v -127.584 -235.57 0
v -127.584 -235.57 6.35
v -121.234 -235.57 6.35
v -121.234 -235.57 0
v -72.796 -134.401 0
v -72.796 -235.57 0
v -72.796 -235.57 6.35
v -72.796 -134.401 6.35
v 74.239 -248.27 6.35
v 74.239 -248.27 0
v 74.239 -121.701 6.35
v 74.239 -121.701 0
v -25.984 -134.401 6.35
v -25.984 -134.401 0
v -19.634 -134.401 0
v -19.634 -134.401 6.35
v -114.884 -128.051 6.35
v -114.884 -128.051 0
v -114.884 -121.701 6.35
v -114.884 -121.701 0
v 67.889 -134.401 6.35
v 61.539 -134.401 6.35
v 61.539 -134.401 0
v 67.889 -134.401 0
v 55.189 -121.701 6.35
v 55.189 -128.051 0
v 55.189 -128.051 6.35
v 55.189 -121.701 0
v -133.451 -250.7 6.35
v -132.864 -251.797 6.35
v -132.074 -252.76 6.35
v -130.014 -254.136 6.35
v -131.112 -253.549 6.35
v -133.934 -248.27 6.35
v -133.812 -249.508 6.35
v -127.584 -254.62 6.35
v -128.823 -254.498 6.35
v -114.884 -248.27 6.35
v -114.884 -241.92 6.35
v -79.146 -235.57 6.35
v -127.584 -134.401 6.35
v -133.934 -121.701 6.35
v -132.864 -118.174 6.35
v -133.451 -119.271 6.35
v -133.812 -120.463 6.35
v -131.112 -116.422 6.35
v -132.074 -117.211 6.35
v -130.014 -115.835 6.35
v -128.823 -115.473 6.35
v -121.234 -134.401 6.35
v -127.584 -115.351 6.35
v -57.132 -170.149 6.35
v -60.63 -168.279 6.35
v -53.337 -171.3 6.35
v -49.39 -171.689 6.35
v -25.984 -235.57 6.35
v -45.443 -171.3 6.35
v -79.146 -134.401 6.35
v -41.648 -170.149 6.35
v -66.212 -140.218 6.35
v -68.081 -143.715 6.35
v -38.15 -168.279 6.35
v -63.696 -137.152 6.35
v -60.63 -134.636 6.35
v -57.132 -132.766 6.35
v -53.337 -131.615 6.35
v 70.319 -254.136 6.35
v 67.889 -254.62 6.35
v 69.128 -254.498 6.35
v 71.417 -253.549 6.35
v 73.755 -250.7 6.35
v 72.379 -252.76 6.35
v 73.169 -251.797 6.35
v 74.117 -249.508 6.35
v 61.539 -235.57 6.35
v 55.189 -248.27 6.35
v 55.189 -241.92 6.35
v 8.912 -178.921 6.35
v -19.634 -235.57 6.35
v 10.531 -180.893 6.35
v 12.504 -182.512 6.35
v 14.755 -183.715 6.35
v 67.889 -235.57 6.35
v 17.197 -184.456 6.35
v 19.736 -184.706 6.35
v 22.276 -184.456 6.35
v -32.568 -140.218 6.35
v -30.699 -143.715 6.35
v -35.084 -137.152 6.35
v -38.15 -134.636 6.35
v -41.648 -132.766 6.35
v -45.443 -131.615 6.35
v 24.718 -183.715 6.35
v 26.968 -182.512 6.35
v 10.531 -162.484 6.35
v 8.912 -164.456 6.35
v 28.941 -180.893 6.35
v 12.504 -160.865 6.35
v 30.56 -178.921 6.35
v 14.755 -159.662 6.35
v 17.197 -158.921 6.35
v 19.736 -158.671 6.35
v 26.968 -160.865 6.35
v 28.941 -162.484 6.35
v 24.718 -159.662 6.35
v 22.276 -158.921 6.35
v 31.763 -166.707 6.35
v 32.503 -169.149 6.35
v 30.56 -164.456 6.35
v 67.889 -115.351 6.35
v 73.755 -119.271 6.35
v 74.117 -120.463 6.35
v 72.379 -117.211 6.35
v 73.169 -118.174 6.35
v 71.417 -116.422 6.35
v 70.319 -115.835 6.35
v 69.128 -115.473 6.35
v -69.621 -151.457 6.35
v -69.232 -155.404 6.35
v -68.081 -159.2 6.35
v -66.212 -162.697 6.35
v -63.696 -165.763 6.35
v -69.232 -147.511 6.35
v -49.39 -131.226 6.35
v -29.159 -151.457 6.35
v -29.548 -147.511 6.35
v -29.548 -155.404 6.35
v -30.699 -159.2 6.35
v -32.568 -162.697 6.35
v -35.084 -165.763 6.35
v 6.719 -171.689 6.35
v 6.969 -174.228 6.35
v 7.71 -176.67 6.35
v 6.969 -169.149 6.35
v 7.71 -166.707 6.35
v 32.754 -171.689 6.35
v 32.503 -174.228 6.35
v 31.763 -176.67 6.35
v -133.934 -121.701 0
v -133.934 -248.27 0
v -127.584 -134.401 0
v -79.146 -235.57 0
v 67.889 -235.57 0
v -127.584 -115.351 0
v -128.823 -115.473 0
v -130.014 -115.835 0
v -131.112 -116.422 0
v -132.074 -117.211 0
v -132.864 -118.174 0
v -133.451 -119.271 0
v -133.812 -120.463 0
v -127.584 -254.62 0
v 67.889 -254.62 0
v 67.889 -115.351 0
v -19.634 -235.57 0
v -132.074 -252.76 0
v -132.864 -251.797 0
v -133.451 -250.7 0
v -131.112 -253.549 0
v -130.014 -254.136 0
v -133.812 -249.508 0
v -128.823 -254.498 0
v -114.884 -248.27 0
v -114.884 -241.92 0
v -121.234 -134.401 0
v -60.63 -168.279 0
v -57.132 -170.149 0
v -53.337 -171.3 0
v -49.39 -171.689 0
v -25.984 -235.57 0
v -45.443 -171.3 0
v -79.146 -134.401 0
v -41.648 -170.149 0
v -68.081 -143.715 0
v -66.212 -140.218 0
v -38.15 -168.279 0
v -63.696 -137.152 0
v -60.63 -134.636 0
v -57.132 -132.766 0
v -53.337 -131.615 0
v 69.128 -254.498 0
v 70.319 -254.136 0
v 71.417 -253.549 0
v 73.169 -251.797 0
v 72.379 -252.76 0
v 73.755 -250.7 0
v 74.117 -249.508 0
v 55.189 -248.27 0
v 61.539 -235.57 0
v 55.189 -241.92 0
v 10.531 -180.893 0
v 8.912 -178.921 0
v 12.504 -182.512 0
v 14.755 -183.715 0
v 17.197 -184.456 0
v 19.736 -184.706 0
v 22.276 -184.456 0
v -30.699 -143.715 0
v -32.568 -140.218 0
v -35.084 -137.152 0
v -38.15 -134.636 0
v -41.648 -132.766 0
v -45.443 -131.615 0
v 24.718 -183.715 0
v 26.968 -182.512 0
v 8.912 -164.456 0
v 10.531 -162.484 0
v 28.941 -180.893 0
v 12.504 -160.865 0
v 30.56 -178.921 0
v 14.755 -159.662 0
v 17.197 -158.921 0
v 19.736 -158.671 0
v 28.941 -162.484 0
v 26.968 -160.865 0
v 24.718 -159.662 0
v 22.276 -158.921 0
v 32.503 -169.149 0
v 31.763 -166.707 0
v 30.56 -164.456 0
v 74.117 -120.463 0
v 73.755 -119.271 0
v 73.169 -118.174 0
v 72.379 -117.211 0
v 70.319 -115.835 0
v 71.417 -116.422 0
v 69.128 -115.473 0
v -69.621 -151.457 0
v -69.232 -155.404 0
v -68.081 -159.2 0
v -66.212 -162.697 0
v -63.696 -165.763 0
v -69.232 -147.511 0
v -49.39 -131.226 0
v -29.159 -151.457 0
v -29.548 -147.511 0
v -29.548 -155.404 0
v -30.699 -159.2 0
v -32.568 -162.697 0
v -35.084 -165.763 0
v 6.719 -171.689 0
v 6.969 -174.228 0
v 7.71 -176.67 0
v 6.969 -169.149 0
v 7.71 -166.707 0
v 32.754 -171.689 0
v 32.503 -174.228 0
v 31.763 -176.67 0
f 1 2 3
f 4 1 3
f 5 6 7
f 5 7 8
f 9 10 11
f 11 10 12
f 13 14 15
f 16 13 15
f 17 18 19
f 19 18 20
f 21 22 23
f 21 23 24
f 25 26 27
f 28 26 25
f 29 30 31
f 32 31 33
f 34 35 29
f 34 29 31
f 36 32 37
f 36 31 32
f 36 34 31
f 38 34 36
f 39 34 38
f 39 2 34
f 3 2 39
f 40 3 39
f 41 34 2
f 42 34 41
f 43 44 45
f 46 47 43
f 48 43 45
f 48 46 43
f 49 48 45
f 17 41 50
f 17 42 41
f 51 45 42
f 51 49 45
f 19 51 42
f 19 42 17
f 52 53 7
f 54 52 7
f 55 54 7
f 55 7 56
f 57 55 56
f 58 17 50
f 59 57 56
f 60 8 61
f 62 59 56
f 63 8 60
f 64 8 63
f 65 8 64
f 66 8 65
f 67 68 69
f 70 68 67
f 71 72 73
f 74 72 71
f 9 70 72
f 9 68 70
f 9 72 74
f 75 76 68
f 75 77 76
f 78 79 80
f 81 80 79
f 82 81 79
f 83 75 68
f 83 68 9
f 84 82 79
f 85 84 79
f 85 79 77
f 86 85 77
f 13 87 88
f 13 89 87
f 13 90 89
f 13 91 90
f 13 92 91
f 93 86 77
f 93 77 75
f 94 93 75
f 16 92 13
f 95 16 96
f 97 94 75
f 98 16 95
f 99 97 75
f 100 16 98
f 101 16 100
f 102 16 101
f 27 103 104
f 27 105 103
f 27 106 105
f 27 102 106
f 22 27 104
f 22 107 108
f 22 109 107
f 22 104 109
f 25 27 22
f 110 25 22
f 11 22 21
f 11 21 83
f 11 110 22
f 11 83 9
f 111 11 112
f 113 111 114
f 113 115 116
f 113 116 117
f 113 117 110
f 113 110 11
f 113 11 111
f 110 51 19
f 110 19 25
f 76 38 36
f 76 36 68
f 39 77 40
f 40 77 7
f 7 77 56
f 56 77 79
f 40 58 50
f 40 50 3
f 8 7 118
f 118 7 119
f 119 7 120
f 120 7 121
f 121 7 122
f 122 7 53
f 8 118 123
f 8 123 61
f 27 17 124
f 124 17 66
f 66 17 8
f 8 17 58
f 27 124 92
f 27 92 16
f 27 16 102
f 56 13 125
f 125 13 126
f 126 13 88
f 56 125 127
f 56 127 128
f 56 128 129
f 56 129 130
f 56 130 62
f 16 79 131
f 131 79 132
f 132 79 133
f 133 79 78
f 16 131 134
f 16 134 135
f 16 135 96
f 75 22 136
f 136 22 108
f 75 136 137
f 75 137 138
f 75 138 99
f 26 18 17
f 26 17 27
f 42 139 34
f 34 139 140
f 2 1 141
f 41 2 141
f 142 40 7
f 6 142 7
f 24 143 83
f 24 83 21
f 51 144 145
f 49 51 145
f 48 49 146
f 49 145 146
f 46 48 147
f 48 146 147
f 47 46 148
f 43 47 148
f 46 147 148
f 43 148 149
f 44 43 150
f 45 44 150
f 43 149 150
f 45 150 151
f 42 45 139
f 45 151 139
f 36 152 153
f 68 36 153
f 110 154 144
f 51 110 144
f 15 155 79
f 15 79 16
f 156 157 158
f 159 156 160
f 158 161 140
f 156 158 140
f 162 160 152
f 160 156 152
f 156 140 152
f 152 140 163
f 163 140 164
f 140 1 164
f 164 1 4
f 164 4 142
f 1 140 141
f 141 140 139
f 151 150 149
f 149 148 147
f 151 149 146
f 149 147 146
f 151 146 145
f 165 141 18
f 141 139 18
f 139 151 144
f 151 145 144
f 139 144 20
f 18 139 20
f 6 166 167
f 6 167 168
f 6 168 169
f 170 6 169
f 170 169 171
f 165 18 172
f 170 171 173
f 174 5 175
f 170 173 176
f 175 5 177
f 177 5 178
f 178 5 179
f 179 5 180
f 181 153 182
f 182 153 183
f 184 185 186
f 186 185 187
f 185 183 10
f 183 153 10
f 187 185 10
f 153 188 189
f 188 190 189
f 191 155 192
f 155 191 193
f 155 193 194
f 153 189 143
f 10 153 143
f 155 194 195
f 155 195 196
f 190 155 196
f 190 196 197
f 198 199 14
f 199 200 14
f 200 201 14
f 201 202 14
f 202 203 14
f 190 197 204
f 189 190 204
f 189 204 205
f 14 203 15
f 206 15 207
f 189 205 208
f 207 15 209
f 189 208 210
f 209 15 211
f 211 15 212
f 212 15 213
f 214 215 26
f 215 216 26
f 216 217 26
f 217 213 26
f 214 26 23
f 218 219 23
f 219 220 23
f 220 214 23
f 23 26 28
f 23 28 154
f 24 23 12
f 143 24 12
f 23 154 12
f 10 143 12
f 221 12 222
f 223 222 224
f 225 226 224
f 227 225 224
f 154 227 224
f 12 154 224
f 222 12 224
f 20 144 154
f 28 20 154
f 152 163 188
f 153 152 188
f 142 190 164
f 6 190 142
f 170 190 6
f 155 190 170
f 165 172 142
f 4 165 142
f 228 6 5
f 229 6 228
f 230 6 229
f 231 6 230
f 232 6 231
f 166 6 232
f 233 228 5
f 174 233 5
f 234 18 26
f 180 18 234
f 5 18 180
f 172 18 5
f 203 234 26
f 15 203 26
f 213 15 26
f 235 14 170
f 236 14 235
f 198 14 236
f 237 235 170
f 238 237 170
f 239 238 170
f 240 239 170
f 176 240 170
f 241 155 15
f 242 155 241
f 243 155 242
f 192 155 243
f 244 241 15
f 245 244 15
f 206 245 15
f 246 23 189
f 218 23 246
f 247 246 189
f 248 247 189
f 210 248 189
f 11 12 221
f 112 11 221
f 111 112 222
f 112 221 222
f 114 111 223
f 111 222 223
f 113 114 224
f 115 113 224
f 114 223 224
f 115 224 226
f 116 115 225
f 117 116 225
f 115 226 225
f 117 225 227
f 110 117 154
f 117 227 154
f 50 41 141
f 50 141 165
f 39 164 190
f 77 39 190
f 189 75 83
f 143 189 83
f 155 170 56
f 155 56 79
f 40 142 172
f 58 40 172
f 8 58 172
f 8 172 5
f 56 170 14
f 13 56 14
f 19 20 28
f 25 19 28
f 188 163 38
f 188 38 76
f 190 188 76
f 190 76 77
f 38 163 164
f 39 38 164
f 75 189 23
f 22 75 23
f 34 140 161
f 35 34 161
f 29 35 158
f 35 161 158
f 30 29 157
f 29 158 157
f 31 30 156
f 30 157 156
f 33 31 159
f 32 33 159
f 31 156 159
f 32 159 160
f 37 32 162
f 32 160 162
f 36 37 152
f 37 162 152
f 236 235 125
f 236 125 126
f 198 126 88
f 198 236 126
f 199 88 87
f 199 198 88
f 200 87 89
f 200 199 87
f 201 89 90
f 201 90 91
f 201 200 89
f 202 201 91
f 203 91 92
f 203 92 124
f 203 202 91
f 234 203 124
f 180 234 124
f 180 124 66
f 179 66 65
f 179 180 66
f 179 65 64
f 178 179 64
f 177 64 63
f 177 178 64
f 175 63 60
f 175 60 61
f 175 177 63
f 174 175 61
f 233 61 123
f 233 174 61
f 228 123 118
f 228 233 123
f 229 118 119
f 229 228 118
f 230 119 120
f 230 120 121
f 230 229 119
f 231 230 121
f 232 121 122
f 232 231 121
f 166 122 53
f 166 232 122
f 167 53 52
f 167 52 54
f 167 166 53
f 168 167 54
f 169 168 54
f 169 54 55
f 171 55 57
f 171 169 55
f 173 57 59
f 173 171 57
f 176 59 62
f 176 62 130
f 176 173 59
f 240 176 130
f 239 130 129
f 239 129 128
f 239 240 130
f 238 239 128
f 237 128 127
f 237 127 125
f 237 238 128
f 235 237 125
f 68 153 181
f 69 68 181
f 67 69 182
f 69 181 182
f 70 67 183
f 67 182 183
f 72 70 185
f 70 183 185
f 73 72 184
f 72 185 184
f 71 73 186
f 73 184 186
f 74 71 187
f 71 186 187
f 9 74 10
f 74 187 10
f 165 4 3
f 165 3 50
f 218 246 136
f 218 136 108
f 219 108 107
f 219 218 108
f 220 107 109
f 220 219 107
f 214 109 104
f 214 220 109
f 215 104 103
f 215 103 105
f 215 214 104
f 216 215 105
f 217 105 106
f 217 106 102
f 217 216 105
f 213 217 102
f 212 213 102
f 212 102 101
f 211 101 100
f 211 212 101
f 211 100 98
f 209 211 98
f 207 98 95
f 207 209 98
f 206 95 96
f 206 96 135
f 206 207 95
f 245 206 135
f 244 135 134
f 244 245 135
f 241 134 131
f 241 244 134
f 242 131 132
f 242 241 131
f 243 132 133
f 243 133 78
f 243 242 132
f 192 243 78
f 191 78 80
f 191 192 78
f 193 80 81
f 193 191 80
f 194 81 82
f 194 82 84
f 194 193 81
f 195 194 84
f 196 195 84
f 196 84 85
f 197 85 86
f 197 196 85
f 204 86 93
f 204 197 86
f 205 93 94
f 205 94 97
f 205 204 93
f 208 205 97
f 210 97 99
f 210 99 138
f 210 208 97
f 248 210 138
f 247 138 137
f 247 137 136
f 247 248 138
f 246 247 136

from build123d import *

# Parameters (mm, degrees)
SKETCH1_R           = 20.2311
SKETCH1_R_2         = 13.0175
SKETCH1_W           = 6.35
SKETCH1_H           = 101.1682
SKETCH1_W_2         = 170.072742275
SKETCH1_H_2         = 6.35
BOSS_EXTRUDE1_DEPTH = 6.35


with BuildPart() as part:
    # Sketch1 → Boss-Extrude1 (new body)
    with BuildSketch(Plane.XY):
        with BuildLine():
            Line((-127.583895856, -254.619594065), (67.888846419, -254.619594065))
            ThreePointArc((67.888846419, -254.619594065), (72.378974479, -252.759722126), (74.238846419, -248.269594065))
            Line((74.238846419, -248.269594065), (74.238846419, -121.701394065))
            ThreePointArc((74.238846419, -121.701394065), (72.378974479, -117.211266005), (67.888846419, -115.351394065))
            Line((67.888846419, -115.351394065), (-127.583895856, -115.351394065))
            ThreePointArc((-127.583895856, -115.351394065), (-132.074023916, -117.211266005), (-133.933895856, -121.701394065))
            Line((-133.933895856, -121.701394065), (-133.933895856, -248.269594065))
            ThreePointArc((-133.933895856, -248.269594065), (-132.074023916, -252.759722126), (-127.583895856, -254.619594065))
        make_face()
        with Locations((-49.389995856, -151.457494065)):
            Circle(SKETCH1_R, mode=Mode.SUBTRACT)
        with Locations((19.736104144, -171.688594065)):
            Circle(SKETCH1_R_2, mode=Mode.SUBTRACT)
        with Locations((-75.971095856, -184.985494065)):
            Rectangle(SKETCH1_W, SKETCH1_H, mode=Mode.SUBTRACT)
        with Locations((-124.408895856, -184.985494065)):
            Rectangle(SKETCH1_W, SKETCH1_H, mode=Mode.SUBTRACT)
        with Locations((64.713846419, -184.985494065)):
            Rectangle(SKETCH1_W, SKETCH1_H, mode=Mode.SUBTRACT)
        with Locations((-22.808895856, -184.985494065)):
            Rectangle(SKETCH1_W, SKETCH1_H, mode=Mode.SUBTRACT)
        with Locations((-29.847524719, -124.876394065)):
            Rectangle(SKETCH1_W_2, SKETCH1_H_2, mode=Mode.SUBTRACT)
        with Locations((-29.847524719, -245.094594065)):
            Rectangle(SKETCH1_W_2, SKETCH1_H_2, mode=Mode.SUBTRACT)
    extrude(amount=BOSS_EXTRUDE1_DEPTH)


solid = part.part
